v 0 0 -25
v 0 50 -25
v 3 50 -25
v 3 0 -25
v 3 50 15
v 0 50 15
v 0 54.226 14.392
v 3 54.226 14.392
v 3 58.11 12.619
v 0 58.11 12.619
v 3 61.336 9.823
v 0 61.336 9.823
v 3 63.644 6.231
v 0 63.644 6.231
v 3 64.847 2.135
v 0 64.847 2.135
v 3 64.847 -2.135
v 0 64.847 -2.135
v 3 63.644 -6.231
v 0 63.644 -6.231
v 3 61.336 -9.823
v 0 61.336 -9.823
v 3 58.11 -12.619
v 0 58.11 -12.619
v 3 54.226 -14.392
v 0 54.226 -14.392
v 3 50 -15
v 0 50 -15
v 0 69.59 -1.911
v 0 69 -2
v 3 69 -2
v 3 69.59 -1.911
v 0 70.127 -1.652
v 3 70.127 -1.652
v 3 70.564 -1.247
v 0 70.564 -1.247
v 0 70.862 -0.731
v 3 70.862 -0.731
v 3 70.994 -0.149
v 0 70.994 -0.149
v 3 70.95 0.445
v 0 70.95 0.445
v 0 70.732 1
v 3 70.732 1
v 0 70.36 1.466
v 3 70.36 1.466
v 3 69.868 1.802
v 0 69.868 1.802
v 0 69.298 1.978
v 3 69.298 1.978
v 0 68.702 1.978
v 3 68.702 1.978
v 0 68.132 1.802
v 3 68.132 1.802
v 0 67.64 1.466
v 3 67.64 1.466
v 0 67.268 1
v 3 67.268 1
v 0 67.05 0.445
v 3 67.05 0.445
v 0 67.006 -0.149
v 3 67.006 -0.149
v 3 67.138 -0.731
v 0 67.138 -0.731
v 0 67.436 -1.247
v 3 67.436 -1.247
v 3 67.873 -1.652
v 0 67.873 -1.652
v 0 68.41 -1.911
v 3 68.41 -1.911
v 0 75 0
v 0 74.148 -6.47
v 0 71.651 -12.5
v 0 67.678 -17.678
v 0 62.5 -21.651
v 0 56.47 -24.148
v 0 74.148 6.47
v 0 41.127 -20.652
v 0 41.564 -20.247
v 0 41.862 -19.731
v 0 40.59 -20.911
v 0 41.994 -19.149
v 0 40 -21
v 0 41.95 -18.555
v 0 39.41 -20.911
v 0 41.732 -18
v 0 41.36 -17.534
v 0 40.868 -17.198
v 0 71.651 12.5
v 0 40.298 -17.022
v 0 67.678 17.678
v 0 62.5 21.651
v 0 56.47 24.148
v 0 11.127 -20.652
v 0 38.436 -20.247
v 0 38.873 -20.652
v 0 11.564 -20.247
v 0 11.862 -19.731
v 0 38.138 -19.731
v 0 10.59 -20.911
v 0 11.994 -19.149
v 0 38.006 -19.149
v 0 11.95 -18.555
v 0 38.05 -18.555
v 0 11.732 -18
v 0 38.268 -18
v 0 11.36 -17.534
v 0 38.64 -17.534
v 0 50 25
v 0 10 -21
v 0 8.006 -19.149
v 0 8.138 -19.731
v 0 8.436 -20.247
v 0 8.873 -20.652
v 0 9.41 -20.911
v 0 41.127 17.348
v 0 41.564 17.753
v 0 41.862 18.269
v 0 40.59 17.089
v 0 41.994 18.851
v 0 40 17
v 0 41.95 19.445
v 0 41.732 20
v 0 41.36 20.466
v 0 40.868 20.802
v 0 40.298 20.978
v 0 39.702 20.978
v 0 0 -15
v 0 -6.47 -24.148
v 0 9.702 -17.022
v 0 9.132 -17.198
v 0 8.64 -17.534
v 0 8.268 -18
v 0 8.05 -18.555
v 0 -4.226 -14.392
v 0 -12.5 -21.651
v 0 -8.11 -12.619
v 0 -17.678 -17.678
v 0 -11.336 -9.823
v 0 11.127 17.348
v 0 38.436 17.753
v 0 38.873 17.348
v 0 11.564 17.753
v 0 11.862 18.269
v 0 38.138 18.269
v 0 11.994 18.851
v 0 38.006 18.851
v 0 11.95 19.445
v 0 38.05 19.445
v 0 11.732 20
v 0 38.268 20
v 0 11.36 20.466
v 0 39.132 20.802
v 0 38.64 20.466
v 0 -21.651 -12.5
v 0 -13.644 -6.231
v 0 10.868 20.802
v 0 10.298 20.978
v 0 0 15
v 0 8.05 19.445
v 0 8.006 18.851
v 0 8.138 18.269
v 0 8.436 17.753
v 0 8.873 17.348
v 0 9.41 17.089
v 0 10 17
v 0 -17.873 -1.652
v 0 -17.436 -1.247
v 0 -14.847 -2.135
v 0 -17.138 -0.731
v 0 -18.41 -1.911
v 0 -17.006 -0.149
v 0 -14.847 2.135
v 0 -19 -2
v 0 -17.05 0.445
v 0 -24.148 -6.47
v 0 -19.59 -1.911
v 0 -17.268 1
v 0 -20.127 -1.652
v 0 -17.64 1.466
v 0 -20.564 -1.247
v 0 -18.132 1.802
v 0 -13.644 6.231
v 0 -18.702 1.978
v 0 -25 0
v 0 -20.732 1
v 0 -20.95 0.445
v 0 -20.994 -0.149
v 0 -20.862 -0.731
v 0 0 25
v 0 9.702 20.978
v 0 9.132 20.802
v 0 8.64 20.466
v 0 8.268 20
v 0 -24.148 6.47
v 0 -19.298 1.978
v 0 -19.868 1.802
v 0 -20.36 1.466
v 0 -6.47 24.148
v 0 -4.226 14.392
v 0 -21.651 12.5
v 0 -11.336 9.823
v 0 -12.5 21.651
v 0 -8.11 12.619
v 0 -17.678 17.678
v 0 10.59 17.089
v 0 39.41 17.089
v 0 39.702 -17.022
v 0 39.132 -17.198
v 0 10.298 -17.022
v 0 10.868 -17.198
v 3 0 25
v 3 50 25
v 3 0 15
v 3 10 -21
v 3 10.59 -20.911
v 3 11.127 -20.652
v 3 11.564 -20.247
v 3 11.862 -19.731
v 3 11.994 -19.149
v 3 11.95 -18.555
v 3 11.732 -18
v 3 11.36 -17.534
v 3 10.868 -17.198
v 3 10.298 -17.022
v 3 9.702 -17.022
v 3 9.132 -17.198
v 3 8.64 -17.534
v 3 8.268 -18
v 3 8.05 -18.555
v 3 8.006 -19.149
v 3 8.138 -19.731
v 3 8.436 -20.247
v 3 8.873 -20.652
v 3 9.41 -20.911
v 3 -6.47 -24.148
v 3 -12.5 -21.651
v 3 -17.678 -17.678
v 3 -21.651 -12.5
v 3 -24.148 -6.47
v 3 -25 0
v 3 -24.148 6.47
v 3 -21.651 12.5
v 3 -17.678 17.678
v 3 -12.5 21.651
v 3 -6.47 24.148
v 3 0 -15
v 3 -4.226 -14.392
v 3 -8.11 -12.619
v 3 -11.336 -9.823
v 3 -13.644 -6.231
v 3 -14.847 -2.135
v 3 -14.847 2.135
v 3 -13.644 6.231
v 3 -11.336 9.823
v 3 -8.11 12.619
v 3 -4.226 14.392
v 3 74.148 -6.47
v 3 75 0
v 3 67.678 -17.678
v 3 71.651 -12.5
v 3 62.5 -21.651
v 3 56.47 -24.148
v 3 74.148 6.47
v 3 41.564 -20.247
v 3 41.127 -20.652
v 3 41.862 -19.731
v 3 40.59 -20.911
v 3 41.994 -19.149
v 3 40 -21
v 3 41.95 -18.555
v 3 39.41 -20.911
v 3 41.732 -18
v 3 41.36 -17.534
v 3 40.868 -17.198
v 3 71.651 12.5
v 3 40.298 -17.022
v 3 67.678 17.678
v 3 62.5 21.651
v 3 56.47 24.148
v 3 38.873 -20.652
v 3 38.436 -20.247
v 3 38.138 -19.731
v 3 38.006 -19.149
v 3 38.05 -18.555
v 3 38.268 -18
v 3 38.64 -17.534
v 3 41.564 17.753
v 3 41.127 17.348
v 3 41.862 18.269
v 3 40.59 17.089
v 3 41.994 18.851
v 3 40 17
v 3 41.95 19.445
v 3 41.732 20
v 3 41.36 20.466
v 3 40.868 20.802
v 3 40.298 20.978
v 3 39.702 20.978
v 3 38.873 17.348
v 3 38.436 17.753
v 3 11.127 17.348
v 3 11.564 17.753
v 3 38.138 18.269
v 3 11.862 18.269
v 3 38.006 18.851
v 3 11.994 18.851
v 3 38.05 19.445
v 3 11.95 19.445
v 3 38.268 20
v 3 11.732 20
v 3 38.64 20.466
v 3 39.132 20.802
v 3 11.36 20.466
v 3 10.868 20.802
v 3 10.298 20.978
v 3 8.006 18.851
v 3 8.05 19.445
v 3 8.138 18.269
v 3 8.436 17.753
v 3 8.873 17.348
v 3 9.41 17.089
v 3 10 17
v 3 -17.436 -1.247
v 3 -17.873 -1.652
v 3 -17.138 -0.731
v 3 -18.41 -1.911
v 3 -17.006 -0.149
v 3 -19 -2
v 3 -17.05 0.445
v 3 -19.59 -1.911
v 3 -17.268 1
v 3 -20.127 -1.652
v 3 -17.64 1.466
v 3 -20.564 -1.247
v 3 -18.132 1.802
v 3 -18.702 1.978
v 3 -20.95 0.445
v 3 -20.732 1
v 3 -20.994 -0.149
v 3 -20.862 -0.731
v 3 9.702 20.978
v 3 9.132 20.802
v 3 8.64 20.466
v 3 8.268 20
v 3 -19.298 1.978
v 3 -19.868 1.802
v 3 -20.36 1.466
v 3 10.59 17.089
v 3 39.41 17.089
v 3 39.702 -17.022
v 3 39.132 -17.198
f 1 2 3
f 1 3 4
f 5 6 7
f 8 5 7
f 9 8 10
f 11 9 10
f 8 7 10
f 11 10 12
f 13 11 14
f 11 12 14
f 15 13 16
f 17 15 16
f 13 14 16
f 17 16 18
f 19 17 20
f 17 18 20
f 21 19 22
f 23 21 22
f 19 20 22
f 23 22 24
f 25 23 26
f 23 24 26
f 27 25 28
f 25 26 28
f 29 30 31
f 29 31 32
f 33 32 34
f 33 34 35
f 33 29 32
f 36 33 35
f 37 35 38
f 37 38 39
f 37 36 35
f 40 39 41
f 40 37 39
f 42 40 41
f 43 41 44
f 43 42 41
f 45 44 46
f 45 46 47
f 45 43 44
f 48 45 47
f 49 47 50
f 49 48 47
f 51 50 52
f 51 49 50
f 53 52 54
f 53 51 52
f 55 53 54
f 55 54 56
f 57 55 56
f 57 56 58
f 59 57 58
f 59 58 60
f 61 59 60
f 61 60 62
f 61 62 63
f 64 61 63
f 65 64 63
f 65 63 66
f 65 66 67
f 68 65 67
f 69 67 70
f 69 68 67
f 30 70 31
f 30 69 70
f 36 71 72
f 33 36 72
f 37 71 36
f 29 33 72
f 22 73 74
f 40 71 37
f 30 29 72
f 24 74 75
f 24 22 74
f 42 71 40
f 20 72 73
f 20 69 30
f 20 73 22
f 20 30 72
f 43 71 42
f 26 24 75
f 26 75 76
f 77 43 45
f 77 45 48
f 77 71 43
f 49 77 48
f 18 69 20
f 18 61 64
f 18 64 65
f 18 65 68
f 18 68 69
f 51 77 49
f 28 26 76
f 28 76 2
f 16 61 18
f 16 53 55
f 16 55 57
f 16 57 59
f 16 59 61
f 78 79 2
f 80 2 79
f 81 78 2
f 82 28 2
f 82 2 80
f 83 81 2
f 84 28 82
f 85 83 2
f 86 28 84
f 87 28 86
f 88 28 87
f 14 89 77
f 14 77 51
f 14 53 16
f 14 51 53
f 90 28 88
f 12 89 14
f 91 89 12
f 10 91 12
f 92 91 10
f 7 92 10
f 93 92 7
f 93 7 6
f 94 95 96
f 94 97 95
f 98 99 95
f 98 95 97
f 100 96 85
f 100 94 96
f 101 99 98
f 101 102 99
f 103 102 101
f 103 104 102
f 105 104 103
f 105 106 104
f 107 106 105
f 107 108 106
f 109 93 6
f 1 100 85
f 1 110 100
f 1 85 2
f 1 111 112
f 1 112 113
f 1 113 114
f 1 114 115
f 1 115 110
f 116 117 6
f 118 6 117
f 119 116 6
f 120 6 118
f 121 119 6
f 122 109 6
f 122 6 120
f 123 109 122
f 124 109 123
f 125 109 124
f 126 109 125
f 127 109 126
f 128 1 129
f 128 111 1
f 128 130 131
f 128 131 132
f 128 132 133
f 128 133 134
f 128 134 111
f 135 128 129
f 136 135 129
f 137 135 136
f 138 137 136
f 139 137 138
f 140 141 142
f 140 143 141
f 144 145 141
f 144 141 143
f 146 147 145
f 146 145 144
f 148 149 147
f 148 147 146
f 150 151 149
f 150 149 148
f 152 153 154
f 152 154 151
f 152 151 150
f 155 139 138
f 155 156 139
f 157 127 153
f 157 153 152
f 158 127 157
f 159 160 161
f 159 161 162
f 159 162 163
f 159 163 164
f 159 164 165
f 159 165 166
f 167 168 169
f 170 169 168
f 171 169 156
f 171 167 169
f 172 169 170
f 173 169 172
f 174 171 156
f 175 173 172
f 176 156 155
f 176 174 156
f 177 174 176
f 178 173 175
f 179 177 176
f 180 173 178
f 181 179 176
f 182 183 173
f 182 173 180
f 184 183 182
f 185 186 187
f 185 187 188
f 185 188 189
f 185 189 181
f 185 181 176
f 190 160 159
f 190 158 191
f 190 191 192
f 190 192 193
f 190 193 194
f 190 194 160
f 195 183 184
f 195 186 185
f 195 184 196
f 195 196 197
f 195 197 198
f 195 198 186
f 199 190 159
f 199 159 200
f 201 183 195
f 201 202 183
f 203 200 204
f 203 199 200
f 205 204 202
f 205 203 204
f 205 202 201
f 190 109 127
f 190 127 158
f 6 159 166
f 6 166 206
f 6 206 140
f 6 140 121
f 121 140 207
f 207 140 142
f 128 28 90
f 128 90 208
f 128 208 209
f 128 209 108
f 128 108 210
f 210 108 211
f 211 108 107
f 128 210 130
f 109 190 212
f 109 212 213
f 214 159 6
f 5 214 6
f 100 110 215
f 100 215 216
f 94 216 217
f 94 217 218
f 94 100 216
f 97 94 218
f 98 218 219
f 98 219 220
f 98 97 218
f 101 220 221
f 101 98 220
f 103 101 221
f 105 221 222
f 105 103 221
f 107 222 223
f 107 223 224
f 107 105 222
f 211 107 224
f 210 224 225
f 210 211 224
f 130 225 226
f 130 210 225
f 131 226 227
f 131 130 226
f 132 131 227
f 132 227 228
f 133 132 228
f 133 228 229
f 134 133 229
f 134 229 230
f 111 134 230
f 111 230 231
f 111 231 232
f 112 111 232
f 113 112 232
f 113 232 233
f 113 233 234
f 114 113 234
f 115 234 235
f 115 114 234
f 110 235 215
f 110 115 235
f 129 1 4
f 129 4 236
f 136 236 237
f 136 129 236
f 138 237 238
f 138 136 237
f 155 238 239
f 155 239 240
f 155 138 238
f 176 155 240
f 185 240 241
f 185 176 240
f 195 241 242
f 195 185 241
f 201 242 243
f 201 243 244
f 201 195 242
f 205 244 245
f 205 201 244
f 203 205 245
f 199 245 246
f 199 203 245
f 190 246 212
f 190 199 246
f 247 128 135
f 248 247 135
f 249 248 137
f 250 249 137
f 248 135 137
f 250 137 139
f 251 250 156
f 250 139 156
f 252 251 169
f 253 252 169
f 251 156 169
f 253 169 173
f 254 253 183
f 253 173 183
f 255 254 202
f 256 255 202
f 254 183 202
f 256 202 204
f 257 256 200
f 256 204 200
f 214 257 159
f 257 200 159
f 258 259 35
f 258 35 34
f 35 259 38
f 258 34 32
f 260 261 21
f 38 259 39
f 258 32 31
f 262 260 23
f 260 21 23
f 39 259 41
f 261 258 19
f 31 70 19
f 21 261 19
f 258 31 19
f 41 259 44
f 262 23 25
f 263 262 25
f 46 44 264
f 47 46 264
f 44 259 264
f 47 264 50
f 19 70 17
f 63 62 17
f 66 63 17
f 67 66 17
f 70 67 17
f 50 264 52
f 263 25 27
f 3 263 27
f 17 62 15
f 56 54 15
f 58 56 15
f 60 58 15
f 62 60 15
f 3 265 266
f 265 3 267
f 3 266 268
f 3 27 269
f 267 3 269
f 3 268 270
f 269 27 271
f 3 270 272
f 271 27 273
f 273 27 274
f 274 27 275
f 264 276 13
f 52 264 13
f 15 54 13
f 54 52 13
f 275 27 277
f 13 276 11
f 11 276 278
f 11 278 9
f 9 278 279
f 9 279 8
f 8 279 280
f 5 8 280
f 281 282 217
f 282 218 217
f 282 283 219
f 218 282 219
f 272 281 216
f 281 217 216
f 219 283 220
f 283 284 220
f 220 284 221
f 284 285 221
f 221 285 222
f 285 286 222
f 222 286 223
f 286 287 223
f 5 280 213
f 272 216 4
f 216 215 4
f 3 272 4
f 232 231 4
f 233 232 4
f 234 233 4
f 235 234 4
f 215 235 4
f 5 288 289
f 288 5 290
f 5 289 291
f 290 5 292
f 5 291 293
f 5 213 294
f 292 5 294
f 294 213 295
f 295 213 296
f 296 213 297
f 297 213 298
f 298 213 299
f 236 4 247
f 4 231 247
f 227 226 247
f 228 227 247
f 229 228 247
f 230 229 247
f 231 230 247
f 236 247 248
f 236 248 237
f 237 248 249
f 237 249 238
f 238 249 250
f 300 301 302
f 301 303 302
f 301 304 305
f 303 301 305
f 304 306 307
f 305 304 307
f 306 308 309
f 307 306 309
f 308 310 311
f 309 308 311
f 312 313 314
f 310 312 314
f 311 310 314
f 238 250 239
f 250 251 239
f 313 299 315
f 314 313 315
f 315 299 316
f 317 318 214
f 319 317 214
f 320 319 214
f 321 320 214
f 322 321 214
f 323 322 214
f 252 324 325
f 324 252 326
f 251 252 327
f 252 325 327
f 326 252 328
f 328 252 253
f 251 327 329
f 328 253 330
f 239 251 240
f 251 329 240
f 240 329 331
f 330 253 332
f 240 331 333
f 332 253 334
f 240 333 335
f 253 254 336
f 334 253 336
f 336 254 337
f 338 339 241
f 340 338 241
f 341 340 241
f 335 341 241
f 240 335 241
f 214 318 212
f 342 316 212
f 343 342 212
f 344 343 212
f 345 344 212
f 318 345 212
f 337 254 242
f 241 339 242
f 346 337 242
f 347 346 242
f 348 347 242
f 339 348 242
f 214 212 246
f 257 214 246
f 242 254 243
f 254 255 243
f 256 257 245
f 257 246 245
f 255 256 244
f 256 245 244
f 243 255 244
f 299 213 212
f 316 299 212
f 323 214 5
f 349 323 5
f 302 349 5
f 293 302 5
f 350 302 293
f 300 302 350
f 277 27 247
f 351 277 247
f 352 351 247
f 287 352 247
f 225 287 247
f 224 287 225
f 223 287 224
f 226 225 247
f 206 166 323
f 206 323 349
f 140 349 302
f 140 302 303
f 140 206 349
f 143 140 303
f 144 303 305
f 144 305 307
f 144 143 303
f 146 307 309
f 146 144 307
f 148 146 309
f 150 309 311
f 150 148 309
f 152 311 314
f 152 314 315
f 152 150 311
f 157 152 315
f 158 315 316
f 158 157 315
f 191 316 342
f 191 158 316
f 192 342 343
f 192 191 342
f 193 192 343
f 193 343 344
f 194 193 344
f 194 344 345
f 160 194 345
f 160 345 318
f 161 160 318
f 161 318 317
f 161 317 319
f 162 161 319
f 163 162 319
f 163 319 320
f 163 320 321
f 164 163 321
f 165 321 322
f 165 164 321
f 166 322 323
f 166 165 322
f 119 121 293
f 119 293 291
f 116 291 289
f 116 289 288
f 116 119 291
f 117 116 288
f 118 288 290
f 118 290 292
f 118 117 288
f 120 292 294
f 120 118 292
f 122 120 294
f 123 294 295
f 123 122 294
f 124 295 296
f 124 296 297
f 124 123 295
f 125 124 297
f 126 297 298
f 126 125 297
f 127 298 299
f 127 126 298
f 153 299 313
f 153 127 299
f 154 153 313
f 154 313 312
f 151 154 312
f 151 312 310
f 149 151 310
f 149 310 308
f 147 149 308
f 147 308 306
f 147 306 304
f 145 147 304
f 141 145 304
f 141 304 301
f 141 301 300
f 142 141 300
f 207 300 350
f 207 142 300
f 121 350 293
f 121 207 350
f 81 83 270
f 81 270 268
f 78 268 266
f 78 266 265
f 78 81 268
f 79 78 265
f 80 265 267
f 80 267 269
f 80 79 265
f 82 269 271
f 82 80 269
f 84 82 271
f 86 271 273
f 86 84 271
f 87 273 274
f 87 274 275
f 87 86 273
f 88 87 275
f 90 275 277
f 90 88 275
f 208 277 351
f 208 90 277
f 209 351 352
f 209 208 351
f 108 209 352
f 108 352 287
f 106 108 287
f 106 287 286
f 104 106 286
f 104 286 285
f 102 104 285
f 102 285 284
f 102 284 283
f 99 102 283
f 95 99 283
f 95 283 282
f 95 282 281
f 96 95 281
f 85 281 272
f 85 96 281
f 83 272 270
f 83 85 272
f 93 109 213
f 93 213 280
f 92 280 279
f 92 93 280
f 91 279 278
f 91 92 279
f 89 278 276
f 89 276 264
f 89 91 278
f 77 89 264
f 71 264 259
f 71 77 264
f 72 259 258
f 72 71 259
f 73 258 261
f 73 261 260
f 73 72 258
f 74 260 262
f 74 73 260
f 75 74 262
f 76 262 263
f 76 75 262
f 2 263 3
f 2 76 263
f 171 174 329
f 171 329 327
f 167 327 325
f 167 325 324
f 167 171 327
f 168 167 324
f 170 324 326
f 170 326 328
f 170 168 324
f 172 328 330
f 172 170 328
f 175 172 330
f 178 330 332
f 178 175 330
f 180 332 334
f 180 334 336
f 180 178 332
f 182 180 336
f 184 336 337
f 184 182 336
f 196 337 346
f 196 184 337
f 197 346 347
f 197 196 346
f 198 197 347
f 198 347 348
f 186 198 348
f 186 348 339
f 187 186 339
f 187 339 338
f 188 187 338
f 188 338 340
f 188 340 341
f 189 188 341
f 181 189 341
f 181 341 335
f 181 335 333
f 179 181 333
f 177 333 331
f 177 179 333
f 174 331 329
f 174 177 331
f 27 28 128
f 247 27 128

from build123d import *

# Parameters (mm, degrees)
SKETCH1_R           = 2
BOSS_EXTRUDE1_DEPTH = 3


with BuildPart() as part:
    # Sketch1 → Boss-Extrude1 (new body)
    with BuildSketch(Plane.YZ):
        with BuildLine():
            Line((0, 25), (50, 25))
            ThreePointArc((50, 25), (75, 0), (50, -25))
            Line((50, -25), (0, -25))
            ThreePointArc((0, -25), (-25, 0), (0, 25))
        make_face()
        with Locations(Location((10, 19, 0), (0, 0, 270))):
            Circle(SKETCH1_R, mode=Mode.SUBTRACT)
        with Locations(Location((40, 19, 0), (0, 0, 270))):
            Circle(SKETCH1_R, mode=Mode.SUBTRACT)
        with Locations(Location((69, 0, 0), (0, 0, 270))):
            Circle(SKETCH1_R, mode=Mode.SUBTRACT)
        with Locations(Location((-19, 0, 0), (0, 0, 270))):
            Circle(SKETCH1_R, mode=Mode.SUBTRACT)
        with Locations(Location((10, -19, 0), (0, 0, 270))):
            Circle(SKETCH1_R, mode=Mode.SUBTRACT)
        with Locations(Location((40, -19, 0), (0, 0, 270))):
            Circle(SKETCH1_R, mode=Mode.SUBTRACT)
        with BuildLine():
            Line((0, 15), (50, 15))
            ThreePointArc((50, 15), (65, 0), (50, -15))
            Line((50, -15), (0, -15))
            ThreePointArc((0, -15), (-15, 0), (0, 15))
        make_face(mode=Mode.SUBTRACT)
    extrude(amount=BOSS_EXTRUDE1_DEPTH)


solid = part.part
